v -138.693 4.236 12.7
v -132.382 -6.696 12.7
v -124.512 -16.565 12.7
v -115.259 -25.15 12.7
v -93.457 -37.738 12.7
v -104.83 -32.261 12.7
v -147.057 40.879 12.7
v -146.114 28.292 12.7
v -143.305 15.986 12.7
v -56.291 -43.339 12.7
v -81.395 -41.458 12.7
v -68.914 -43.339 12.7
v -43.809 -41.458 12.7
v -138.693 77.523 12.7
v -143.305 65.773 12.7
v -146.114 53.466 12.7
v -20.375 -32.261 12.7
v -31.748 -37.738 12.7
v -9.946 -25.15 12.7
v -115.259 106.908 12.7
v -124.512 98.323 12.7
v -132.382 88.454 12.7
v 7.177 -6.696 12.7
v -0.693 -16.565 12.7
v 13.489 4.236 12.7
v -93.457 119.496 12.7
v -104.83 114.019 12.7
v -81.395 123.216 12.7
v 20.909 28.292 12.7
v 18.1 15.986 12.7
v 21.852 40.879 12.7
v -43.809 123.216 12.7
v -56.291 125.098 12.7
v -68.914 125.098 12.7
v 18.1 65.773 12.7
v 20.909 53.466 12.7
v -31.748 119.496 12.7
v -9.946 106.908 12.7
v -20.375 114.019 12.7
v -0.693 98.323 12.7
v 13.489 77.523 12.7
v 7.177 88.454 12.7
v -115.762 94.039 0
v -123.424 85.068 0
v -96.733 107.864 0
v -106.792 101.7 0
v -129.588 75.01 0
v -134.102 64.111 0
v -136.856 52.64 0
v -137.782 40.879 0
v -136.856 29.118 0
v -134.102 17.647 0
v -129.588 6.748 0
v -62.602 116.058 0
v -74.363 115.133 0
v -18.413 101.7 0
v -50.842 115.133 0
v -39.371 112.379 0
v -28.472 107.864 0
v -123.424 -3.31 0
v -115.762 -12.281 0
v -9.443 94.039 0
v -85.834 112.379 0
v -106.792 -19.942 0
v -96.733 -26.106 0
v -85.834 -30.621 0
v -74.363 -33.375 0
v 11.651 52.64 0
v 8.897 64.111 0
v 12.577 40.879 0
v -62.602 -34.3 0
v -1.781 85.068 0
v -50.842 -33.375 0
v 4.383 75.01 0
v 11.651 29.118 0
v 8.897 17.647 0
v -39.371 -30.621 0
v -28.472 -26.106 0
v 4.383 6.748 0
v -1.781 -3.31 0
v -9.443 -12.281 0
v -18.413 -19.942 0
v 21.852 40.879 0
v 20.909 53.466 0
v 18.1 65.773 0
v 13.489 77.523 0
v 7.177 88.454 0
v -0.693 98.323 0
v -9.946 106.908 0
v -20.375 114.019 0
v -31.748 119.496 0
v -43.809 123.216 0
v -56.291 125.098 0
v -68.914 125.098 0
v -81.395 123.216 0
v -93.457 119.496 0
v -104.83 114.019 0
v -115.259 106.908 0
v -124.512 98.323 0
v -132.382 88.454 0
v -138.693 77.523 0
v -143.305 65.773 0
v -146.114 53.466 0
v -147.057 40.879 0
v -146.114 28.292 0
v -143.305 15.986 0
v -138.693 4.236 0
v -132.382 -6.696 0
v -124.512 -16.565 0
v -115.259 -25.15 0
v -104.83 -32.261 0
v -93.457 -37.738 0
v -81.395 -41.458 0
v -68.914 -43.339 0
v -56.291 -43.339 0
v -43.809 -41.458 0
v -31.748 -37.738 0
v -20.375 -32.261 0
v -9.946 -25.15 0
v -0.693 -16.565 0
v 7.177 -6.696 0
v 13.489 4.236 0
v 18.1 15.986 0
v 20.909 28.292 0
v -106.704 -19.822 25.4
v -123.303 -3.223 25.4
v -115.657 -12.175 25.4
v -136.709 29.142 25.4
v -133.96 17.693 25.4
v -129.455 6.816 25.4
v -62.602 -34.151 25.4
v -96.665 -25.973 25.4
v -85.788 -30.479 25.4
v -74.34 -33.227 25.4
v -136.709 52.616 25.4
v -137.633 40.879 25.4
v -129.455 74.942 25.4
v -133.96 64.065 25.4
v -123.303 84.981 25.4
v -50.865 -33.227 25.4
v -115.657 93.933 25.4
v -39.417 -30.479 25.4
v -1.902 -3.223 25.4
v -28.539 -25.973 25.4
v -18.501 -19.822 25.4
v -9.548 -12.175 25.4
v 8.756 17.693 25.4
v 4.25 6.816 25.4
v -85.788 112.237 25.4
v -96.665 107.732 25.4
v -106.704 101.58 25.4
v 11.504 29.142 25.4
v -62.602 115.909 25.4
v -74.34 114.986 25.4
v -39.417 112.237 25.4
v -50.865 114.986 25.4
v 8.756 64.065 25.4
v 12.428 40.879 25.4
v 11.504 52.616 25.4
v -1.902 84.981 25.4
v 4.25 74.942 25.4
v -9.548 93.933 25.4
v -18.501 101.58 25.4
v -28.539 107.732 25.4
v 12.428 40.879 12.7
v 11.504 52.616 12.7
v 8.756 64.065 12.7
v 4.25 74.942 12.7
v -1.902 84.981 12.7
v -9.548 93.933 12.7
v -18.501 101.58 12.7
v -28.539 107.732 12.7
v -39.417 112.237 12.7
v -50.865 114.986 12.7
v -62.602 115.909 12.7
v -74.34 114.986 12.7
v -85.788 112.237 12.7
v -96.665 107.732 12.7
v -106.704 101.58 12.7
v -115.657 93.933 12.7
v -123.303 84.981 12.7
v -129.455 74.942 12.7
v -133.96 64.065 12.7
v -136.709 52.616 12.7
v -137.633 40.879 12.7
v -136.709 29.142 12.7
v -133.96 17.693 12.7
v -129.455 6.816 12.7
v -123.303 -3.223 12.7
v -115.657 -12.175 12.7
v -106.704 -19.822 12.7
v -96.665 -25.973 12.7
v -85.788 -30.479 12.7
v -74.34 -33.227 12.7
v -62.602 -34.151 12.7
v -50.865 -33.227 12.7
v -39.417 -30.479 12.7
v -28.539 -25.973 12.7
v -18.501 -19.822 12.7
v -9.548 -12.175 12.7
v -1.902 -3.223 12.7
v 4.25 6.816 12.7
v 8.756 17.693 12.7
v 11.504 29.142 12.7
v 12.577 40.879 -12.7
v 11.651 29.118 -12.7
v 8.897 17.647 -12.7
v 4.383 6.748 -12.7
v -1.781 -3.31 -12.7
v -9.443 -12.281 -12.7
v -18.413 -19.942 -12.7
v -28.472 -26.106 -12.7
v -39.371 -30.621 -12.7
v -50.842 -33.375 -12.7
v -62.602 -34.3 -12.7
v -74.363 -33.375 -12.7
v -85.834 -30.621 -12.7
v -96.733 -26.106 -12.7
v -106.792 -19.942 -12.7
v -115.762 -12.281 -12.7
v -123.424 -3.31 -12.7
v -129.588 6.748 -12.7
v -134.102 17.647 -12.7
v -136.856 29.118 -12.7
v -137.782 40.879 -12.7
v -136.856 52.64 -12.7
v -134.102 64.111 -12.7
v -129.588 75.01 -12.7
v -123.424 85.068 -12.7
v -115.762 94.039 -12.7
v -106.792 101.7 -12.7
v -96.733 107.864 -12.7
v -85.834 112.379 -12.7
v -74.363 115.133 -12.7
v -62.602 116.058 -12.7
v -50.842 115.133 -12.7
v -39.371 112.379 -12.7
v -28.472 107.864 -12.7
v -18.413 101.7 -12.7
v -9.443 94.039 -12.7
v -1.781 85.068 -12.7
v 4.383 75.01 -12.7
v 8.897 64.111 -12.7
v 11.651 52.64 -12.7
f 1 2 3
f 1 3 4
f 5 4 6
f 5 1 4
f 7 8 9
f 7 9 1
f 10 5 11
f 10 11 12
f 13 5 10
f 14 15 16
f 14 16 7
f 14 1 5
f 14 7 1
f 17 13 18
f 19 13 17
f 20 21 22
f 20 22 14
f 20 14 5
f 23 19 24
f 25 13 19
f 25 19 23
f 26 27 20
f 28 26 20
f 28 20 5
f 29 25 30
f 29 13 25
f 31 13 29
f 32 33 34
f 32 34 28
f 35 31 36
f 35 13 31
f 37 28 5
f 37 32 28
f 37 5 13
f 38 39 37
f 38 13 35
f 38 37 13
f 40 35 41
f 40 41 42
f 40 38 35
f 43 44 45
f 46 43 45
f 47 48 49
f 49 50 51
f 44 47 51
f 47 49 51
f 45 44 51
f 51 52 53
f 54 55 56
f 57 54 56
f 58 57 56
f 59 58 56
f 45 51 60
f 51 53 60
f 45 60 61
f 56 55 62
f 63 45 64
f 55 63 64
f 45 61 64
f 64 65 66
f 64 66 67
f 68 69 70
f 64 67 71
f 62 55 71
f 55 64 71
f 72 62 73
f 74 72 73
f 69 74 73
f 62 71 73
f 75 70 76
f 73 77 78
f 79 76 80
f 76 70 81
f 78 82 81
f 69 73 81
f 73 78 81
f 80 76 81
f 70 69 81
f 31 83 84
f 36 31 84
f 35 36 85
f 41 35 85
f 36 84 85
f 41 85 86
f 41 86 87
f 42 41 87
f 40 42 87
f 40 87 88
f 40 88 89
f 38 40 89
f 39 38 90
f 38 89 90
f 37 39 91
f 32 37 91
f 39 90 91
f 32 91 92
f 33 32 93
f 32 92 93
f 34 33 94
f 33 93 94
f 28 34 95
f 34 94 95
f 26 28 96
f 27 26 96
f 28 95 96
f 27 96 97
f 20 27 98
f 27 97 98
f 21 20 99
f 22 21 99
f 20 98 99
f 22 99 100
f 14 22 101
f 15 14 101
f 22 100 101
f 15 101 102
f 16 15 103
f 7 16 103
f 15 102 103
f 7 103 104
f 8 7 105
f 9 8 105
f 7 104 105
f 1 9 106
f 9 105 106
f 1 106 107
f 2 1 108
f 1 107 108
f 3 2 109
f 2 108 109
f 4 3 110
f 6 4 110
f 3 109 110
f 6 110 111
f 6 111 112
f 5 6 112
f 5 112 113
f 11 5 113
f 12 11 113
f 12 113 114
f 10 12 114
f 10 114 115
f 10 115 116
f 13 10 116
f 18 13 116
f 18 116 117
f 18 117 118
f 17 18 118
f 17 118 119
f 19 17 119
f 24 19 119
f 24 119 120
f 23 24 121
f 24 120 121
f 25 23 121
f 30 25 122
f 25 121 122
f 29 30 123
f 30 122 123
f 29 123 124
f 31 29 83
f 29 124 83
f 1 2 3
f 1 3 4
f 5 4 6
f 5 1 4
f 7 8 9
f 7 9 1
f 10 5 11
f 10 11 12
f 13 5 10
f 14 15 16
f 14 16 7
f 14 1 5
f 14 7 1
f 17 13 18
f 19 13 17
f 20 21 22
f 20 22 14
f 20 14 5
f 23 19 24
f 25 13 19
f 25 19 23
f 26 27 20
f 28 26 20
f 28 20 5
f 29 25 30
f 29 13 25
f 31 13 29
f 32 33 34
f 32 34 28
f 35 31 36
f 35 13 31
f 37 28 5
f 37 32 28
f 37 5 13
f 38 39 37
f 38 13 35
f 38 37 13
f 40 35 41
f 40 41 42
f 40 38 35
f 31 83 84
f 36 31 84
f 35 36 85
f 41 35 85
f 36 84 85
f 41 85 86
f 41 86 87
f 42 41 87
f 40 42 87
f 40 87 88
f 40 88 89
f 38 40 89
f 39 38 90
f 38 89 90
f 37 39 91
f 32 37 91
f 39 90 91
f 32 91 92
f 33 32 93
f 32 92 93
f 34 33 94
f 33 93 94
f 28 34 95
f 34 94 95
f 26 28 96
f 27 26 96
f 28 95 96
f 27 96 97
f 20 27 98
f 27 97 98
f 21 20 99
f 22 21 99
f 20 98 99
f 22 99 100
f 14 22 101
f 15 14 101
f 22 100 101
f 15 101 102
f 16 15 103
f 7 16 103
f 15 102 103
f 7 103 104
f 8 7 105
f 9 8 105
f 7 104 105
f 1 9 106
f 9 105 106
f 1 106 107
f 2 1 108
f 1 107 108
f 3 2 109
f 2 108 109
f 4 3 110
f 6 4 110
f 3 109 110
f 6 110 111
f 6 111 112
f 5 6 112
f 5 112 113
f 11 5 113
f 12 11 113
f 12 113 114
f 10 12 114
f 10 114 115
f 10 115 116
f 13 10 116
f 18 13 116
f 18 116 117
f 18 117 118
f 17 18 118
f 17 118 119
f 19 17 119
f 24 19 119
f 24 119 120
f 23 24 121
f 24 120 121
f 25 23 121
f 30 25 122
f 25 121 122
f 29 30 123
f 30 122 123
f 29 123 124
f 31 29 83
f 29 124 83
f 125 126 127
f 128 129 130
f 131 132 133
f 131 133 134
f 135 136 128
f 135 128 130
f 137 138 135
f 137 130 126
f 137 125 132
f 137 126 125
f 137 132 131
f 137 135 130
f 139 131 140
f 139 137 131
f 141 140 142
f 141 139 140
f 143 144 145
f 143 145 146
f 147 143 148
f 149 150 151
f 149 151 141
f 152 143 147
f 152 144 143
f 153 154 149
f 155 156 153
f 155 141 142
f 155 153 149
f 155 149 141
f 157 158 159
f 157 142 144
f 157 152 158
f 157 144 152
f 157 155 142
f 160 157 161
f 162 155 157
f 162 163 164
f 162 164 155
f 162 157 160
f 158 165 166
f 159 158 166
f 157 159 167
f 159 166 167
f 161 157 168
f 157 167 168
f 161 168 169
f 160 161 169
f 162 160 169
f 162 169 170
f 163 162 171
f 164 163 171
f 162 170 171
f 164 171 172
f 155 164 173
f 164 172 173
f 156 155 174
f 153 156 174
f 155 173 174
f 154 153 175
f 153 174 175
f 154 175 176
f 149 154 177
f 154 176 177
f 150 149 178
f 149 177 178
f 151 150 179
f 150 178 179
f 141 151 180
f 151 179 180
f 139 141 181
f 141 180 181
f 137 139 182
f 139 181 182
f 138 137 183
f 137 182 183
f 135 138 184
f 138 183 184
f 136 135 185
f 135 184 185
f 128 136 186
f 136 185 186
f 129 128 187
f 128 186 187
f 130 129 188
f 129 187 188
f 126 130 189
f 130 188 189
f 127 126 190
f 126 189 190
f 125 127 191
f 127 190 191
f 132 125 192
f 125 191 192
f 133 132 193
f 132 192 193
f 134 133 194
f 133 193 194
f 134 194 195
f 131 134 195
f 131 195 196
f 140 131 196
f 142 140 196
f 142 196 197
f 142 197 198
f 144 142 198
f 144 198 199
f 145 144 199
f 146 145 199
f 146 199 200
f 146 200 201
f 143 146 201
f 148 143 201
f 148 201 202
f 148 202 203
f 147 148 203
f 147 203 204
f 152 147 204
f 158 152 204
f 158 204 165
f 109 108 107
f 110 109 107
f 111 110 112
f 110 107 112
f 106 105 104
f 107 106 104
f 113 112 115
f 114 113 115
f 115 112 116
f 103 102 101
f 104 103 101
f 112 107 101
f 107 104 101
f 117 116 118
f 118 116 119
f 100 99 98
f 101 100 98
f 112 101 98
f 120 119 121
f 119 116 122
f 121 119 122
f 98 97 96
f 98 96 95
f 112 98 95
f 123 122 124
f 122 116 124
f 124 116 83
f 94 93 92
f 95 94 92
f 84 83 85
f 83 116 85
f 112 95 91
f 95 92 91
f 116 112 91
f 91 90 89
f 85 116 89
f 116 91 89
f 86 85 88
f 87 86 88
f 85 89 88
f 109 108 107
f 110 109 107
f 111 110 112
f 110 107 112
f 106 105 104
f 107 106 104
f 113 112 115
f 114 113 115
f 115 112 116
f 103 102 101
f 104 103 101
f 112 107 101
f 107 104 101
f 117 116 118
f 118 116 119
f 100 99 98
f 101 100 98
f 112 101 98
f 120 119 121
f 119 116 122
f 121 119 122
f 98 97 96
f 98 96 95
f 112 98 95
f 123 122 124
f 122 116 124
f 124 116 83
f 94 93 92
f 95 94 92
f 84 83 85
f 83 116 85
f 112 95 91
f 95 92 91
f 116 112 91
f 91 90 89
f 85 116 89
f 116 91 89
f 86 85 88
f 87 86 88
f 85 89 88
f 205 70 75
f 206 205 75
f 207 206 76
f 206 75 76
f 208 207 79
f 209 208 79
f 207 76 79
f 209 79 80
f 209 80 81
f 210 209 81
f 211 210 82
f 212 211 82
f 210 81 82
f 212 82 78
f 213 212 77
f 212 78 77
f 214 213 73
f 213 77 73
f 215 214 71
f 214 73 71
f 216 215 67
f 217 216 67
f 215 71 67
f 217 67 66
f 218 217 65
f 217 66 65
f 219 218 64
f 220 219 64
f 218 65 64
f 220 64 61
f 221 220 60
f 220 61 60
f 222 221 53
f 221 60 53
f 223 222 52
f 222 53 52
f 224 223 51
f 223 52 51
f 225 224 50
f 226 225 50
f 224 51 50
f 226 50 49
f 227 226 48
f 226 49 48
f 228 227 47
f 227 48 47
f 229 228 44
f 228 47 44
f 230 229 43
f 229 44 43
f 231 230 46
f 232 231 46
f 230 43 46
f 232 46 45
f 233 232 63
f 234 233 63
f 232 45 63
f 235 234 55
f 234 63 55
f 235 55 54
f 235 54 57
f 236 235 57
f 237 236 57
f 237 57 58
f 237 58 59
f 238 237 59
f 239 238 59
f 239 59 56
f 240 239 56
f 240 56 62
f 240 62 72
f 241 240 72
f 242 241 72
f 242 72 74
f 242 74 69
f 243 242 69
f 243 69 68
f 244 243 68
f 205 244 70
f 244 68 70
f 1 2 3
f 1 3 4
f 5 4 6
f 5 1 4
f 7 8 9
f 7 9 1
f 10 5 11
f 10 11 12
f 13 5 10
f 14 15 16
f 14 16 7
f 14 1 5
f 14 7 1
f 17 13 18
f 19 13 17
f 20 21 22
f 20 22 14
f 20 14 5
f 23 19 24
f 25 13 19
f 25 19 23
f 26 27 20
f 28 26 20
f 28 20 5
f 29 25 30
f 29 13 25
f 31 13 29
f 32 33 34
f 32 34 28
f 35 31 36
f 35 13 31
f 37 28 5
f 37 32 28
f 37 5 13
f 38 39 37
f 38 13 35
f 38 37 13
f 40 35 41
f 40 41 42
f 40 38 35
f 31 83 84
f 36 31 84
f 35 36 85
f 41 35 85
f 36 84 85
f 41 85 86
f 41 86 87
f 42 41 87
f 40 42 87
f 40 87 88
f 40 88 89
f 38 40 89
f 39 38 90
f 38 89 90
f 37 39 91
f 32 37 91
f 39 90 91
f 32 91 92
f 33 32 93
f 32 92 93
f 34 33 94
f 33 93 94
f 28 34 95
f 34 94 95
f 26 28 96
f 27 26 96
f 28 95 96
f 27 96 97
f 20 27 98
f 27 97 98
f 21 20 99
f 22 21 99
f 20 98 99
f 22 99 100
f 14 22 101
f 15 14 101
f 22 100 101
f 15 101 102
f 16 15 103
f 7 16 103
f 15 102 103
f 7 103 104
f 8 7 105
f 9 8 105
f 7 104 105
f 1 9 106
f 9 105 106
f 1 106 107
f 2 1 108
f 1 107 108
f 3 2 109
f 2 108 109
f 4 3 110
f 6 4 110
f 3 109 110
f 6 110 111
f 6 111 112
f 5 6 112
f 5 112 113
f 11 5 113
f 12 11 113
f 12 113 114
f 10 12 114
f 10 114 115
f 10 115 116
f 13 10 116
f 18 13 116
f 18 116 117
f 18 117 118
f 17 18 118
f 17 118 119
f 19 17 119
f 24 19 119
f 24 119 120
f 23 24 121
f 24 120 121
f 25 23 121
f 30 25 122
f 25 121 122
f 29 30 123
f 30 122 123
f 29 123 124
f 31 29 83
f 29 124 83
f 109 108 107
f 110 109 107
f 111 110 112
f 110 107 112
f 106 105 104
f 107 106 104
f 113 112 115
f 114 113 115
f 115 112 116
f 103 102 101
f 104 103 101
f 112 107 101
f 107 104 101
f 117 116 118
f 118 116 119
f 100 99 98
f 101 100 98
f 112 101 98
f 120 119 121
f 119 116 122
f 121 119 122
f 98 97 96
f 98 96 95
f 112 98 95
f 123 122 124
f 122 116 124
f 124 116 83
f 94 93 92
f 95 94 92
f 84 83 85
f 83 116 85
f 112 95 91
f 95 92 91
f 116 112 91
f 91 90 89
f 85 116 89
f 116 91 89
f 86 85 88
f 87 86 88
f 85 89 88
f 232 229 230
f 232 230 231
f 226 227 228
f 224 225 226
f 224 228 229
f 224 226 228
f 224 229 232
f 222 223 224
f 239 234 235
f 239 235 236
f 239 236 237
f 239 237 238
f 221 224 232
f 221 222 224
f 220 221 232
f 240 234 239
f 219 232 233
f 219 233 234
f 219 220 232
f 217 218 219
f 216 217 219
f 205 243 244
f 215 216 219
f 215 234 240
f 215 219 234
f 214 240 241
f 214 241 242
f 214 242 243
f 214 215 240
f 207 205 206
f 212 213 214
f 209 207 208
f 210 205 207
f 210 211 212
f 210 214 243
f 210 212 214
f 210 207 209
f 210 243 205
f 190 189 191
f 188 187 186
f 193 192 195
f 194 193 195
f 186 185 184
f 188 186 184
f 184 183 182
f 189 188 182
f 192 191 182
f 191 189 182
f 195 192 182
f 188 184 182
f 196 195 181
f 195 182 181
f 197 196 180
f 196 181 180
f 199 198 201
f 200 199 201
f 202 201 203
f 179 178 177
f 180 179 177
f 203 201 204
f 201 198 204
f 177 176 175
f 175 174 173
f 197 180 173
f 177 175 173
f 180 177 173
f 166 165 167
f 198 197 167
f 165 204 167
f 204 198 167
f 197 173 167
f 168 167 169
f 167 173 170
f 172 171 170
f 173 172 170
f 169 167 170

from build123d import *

# Parameters (mm, degrees)
F0_R      = 84.454648138
F3_DEPTH  = 12.7
F1_R      = 84.454648138
F2_R      = 84.454648138
F5_R      = 75.179264918
F7_DEPTH  = 12.7
F9_R      = 75.0302642661
F10_DEPTH = 12.7


with BuildPart() as f3:
    # F0 (on Top) → F3 (new body)
    with BuildSketch(Plane.XY):
        with Locations((-62.6023933291, 40.8790819347)):
            Circle(F0_R)
    extrude(amount=F3_DEPTH)


with BuildPart() as f3b:
    # F1 (on face) → F3, piece 2 (new body)
    with BuildSketch(Plane.XY):
        with Locations((-62.6023933291, 40.8790819347)):
            Circle(F1_R)
    extrude(amount=F3_DEPTH)


with BuildPart() as f3c:
    # F2 (on face) → F3, piece 3 (new body)
    with BuildSketch(Plane.XY):
        with Locations((-62.6023933291, 40.8790819347)):
            Circle(F2_R)
    extrude(amount=F3_DEPTH)


with BuildPart() as f7:
    # F5 (on face) → F7 (new body)
    with BuildSketch(Plane(origin=(0, 0, 0), x_dir=(1, 0, 0), z_dir=(0, 0, -1))):
        with Locations((-62.6023933291, -40.8790819347)):
            Circle(F5_R)
    extrude(amount=F7_DEPTH)


with BuildPart() as f10:
    # F9 (on face) → F10 (new body)
    with BuildSketch(Plane.XY.offset(12.7)):
        with Locations((-62.6023933291, 40.8790819347)):
            Circle(F9_R)
    extrude(amount=F10_DEPTH)


solid = Compound([f3.part, f3b.part, f3c.part, f7.part, f10.part])
